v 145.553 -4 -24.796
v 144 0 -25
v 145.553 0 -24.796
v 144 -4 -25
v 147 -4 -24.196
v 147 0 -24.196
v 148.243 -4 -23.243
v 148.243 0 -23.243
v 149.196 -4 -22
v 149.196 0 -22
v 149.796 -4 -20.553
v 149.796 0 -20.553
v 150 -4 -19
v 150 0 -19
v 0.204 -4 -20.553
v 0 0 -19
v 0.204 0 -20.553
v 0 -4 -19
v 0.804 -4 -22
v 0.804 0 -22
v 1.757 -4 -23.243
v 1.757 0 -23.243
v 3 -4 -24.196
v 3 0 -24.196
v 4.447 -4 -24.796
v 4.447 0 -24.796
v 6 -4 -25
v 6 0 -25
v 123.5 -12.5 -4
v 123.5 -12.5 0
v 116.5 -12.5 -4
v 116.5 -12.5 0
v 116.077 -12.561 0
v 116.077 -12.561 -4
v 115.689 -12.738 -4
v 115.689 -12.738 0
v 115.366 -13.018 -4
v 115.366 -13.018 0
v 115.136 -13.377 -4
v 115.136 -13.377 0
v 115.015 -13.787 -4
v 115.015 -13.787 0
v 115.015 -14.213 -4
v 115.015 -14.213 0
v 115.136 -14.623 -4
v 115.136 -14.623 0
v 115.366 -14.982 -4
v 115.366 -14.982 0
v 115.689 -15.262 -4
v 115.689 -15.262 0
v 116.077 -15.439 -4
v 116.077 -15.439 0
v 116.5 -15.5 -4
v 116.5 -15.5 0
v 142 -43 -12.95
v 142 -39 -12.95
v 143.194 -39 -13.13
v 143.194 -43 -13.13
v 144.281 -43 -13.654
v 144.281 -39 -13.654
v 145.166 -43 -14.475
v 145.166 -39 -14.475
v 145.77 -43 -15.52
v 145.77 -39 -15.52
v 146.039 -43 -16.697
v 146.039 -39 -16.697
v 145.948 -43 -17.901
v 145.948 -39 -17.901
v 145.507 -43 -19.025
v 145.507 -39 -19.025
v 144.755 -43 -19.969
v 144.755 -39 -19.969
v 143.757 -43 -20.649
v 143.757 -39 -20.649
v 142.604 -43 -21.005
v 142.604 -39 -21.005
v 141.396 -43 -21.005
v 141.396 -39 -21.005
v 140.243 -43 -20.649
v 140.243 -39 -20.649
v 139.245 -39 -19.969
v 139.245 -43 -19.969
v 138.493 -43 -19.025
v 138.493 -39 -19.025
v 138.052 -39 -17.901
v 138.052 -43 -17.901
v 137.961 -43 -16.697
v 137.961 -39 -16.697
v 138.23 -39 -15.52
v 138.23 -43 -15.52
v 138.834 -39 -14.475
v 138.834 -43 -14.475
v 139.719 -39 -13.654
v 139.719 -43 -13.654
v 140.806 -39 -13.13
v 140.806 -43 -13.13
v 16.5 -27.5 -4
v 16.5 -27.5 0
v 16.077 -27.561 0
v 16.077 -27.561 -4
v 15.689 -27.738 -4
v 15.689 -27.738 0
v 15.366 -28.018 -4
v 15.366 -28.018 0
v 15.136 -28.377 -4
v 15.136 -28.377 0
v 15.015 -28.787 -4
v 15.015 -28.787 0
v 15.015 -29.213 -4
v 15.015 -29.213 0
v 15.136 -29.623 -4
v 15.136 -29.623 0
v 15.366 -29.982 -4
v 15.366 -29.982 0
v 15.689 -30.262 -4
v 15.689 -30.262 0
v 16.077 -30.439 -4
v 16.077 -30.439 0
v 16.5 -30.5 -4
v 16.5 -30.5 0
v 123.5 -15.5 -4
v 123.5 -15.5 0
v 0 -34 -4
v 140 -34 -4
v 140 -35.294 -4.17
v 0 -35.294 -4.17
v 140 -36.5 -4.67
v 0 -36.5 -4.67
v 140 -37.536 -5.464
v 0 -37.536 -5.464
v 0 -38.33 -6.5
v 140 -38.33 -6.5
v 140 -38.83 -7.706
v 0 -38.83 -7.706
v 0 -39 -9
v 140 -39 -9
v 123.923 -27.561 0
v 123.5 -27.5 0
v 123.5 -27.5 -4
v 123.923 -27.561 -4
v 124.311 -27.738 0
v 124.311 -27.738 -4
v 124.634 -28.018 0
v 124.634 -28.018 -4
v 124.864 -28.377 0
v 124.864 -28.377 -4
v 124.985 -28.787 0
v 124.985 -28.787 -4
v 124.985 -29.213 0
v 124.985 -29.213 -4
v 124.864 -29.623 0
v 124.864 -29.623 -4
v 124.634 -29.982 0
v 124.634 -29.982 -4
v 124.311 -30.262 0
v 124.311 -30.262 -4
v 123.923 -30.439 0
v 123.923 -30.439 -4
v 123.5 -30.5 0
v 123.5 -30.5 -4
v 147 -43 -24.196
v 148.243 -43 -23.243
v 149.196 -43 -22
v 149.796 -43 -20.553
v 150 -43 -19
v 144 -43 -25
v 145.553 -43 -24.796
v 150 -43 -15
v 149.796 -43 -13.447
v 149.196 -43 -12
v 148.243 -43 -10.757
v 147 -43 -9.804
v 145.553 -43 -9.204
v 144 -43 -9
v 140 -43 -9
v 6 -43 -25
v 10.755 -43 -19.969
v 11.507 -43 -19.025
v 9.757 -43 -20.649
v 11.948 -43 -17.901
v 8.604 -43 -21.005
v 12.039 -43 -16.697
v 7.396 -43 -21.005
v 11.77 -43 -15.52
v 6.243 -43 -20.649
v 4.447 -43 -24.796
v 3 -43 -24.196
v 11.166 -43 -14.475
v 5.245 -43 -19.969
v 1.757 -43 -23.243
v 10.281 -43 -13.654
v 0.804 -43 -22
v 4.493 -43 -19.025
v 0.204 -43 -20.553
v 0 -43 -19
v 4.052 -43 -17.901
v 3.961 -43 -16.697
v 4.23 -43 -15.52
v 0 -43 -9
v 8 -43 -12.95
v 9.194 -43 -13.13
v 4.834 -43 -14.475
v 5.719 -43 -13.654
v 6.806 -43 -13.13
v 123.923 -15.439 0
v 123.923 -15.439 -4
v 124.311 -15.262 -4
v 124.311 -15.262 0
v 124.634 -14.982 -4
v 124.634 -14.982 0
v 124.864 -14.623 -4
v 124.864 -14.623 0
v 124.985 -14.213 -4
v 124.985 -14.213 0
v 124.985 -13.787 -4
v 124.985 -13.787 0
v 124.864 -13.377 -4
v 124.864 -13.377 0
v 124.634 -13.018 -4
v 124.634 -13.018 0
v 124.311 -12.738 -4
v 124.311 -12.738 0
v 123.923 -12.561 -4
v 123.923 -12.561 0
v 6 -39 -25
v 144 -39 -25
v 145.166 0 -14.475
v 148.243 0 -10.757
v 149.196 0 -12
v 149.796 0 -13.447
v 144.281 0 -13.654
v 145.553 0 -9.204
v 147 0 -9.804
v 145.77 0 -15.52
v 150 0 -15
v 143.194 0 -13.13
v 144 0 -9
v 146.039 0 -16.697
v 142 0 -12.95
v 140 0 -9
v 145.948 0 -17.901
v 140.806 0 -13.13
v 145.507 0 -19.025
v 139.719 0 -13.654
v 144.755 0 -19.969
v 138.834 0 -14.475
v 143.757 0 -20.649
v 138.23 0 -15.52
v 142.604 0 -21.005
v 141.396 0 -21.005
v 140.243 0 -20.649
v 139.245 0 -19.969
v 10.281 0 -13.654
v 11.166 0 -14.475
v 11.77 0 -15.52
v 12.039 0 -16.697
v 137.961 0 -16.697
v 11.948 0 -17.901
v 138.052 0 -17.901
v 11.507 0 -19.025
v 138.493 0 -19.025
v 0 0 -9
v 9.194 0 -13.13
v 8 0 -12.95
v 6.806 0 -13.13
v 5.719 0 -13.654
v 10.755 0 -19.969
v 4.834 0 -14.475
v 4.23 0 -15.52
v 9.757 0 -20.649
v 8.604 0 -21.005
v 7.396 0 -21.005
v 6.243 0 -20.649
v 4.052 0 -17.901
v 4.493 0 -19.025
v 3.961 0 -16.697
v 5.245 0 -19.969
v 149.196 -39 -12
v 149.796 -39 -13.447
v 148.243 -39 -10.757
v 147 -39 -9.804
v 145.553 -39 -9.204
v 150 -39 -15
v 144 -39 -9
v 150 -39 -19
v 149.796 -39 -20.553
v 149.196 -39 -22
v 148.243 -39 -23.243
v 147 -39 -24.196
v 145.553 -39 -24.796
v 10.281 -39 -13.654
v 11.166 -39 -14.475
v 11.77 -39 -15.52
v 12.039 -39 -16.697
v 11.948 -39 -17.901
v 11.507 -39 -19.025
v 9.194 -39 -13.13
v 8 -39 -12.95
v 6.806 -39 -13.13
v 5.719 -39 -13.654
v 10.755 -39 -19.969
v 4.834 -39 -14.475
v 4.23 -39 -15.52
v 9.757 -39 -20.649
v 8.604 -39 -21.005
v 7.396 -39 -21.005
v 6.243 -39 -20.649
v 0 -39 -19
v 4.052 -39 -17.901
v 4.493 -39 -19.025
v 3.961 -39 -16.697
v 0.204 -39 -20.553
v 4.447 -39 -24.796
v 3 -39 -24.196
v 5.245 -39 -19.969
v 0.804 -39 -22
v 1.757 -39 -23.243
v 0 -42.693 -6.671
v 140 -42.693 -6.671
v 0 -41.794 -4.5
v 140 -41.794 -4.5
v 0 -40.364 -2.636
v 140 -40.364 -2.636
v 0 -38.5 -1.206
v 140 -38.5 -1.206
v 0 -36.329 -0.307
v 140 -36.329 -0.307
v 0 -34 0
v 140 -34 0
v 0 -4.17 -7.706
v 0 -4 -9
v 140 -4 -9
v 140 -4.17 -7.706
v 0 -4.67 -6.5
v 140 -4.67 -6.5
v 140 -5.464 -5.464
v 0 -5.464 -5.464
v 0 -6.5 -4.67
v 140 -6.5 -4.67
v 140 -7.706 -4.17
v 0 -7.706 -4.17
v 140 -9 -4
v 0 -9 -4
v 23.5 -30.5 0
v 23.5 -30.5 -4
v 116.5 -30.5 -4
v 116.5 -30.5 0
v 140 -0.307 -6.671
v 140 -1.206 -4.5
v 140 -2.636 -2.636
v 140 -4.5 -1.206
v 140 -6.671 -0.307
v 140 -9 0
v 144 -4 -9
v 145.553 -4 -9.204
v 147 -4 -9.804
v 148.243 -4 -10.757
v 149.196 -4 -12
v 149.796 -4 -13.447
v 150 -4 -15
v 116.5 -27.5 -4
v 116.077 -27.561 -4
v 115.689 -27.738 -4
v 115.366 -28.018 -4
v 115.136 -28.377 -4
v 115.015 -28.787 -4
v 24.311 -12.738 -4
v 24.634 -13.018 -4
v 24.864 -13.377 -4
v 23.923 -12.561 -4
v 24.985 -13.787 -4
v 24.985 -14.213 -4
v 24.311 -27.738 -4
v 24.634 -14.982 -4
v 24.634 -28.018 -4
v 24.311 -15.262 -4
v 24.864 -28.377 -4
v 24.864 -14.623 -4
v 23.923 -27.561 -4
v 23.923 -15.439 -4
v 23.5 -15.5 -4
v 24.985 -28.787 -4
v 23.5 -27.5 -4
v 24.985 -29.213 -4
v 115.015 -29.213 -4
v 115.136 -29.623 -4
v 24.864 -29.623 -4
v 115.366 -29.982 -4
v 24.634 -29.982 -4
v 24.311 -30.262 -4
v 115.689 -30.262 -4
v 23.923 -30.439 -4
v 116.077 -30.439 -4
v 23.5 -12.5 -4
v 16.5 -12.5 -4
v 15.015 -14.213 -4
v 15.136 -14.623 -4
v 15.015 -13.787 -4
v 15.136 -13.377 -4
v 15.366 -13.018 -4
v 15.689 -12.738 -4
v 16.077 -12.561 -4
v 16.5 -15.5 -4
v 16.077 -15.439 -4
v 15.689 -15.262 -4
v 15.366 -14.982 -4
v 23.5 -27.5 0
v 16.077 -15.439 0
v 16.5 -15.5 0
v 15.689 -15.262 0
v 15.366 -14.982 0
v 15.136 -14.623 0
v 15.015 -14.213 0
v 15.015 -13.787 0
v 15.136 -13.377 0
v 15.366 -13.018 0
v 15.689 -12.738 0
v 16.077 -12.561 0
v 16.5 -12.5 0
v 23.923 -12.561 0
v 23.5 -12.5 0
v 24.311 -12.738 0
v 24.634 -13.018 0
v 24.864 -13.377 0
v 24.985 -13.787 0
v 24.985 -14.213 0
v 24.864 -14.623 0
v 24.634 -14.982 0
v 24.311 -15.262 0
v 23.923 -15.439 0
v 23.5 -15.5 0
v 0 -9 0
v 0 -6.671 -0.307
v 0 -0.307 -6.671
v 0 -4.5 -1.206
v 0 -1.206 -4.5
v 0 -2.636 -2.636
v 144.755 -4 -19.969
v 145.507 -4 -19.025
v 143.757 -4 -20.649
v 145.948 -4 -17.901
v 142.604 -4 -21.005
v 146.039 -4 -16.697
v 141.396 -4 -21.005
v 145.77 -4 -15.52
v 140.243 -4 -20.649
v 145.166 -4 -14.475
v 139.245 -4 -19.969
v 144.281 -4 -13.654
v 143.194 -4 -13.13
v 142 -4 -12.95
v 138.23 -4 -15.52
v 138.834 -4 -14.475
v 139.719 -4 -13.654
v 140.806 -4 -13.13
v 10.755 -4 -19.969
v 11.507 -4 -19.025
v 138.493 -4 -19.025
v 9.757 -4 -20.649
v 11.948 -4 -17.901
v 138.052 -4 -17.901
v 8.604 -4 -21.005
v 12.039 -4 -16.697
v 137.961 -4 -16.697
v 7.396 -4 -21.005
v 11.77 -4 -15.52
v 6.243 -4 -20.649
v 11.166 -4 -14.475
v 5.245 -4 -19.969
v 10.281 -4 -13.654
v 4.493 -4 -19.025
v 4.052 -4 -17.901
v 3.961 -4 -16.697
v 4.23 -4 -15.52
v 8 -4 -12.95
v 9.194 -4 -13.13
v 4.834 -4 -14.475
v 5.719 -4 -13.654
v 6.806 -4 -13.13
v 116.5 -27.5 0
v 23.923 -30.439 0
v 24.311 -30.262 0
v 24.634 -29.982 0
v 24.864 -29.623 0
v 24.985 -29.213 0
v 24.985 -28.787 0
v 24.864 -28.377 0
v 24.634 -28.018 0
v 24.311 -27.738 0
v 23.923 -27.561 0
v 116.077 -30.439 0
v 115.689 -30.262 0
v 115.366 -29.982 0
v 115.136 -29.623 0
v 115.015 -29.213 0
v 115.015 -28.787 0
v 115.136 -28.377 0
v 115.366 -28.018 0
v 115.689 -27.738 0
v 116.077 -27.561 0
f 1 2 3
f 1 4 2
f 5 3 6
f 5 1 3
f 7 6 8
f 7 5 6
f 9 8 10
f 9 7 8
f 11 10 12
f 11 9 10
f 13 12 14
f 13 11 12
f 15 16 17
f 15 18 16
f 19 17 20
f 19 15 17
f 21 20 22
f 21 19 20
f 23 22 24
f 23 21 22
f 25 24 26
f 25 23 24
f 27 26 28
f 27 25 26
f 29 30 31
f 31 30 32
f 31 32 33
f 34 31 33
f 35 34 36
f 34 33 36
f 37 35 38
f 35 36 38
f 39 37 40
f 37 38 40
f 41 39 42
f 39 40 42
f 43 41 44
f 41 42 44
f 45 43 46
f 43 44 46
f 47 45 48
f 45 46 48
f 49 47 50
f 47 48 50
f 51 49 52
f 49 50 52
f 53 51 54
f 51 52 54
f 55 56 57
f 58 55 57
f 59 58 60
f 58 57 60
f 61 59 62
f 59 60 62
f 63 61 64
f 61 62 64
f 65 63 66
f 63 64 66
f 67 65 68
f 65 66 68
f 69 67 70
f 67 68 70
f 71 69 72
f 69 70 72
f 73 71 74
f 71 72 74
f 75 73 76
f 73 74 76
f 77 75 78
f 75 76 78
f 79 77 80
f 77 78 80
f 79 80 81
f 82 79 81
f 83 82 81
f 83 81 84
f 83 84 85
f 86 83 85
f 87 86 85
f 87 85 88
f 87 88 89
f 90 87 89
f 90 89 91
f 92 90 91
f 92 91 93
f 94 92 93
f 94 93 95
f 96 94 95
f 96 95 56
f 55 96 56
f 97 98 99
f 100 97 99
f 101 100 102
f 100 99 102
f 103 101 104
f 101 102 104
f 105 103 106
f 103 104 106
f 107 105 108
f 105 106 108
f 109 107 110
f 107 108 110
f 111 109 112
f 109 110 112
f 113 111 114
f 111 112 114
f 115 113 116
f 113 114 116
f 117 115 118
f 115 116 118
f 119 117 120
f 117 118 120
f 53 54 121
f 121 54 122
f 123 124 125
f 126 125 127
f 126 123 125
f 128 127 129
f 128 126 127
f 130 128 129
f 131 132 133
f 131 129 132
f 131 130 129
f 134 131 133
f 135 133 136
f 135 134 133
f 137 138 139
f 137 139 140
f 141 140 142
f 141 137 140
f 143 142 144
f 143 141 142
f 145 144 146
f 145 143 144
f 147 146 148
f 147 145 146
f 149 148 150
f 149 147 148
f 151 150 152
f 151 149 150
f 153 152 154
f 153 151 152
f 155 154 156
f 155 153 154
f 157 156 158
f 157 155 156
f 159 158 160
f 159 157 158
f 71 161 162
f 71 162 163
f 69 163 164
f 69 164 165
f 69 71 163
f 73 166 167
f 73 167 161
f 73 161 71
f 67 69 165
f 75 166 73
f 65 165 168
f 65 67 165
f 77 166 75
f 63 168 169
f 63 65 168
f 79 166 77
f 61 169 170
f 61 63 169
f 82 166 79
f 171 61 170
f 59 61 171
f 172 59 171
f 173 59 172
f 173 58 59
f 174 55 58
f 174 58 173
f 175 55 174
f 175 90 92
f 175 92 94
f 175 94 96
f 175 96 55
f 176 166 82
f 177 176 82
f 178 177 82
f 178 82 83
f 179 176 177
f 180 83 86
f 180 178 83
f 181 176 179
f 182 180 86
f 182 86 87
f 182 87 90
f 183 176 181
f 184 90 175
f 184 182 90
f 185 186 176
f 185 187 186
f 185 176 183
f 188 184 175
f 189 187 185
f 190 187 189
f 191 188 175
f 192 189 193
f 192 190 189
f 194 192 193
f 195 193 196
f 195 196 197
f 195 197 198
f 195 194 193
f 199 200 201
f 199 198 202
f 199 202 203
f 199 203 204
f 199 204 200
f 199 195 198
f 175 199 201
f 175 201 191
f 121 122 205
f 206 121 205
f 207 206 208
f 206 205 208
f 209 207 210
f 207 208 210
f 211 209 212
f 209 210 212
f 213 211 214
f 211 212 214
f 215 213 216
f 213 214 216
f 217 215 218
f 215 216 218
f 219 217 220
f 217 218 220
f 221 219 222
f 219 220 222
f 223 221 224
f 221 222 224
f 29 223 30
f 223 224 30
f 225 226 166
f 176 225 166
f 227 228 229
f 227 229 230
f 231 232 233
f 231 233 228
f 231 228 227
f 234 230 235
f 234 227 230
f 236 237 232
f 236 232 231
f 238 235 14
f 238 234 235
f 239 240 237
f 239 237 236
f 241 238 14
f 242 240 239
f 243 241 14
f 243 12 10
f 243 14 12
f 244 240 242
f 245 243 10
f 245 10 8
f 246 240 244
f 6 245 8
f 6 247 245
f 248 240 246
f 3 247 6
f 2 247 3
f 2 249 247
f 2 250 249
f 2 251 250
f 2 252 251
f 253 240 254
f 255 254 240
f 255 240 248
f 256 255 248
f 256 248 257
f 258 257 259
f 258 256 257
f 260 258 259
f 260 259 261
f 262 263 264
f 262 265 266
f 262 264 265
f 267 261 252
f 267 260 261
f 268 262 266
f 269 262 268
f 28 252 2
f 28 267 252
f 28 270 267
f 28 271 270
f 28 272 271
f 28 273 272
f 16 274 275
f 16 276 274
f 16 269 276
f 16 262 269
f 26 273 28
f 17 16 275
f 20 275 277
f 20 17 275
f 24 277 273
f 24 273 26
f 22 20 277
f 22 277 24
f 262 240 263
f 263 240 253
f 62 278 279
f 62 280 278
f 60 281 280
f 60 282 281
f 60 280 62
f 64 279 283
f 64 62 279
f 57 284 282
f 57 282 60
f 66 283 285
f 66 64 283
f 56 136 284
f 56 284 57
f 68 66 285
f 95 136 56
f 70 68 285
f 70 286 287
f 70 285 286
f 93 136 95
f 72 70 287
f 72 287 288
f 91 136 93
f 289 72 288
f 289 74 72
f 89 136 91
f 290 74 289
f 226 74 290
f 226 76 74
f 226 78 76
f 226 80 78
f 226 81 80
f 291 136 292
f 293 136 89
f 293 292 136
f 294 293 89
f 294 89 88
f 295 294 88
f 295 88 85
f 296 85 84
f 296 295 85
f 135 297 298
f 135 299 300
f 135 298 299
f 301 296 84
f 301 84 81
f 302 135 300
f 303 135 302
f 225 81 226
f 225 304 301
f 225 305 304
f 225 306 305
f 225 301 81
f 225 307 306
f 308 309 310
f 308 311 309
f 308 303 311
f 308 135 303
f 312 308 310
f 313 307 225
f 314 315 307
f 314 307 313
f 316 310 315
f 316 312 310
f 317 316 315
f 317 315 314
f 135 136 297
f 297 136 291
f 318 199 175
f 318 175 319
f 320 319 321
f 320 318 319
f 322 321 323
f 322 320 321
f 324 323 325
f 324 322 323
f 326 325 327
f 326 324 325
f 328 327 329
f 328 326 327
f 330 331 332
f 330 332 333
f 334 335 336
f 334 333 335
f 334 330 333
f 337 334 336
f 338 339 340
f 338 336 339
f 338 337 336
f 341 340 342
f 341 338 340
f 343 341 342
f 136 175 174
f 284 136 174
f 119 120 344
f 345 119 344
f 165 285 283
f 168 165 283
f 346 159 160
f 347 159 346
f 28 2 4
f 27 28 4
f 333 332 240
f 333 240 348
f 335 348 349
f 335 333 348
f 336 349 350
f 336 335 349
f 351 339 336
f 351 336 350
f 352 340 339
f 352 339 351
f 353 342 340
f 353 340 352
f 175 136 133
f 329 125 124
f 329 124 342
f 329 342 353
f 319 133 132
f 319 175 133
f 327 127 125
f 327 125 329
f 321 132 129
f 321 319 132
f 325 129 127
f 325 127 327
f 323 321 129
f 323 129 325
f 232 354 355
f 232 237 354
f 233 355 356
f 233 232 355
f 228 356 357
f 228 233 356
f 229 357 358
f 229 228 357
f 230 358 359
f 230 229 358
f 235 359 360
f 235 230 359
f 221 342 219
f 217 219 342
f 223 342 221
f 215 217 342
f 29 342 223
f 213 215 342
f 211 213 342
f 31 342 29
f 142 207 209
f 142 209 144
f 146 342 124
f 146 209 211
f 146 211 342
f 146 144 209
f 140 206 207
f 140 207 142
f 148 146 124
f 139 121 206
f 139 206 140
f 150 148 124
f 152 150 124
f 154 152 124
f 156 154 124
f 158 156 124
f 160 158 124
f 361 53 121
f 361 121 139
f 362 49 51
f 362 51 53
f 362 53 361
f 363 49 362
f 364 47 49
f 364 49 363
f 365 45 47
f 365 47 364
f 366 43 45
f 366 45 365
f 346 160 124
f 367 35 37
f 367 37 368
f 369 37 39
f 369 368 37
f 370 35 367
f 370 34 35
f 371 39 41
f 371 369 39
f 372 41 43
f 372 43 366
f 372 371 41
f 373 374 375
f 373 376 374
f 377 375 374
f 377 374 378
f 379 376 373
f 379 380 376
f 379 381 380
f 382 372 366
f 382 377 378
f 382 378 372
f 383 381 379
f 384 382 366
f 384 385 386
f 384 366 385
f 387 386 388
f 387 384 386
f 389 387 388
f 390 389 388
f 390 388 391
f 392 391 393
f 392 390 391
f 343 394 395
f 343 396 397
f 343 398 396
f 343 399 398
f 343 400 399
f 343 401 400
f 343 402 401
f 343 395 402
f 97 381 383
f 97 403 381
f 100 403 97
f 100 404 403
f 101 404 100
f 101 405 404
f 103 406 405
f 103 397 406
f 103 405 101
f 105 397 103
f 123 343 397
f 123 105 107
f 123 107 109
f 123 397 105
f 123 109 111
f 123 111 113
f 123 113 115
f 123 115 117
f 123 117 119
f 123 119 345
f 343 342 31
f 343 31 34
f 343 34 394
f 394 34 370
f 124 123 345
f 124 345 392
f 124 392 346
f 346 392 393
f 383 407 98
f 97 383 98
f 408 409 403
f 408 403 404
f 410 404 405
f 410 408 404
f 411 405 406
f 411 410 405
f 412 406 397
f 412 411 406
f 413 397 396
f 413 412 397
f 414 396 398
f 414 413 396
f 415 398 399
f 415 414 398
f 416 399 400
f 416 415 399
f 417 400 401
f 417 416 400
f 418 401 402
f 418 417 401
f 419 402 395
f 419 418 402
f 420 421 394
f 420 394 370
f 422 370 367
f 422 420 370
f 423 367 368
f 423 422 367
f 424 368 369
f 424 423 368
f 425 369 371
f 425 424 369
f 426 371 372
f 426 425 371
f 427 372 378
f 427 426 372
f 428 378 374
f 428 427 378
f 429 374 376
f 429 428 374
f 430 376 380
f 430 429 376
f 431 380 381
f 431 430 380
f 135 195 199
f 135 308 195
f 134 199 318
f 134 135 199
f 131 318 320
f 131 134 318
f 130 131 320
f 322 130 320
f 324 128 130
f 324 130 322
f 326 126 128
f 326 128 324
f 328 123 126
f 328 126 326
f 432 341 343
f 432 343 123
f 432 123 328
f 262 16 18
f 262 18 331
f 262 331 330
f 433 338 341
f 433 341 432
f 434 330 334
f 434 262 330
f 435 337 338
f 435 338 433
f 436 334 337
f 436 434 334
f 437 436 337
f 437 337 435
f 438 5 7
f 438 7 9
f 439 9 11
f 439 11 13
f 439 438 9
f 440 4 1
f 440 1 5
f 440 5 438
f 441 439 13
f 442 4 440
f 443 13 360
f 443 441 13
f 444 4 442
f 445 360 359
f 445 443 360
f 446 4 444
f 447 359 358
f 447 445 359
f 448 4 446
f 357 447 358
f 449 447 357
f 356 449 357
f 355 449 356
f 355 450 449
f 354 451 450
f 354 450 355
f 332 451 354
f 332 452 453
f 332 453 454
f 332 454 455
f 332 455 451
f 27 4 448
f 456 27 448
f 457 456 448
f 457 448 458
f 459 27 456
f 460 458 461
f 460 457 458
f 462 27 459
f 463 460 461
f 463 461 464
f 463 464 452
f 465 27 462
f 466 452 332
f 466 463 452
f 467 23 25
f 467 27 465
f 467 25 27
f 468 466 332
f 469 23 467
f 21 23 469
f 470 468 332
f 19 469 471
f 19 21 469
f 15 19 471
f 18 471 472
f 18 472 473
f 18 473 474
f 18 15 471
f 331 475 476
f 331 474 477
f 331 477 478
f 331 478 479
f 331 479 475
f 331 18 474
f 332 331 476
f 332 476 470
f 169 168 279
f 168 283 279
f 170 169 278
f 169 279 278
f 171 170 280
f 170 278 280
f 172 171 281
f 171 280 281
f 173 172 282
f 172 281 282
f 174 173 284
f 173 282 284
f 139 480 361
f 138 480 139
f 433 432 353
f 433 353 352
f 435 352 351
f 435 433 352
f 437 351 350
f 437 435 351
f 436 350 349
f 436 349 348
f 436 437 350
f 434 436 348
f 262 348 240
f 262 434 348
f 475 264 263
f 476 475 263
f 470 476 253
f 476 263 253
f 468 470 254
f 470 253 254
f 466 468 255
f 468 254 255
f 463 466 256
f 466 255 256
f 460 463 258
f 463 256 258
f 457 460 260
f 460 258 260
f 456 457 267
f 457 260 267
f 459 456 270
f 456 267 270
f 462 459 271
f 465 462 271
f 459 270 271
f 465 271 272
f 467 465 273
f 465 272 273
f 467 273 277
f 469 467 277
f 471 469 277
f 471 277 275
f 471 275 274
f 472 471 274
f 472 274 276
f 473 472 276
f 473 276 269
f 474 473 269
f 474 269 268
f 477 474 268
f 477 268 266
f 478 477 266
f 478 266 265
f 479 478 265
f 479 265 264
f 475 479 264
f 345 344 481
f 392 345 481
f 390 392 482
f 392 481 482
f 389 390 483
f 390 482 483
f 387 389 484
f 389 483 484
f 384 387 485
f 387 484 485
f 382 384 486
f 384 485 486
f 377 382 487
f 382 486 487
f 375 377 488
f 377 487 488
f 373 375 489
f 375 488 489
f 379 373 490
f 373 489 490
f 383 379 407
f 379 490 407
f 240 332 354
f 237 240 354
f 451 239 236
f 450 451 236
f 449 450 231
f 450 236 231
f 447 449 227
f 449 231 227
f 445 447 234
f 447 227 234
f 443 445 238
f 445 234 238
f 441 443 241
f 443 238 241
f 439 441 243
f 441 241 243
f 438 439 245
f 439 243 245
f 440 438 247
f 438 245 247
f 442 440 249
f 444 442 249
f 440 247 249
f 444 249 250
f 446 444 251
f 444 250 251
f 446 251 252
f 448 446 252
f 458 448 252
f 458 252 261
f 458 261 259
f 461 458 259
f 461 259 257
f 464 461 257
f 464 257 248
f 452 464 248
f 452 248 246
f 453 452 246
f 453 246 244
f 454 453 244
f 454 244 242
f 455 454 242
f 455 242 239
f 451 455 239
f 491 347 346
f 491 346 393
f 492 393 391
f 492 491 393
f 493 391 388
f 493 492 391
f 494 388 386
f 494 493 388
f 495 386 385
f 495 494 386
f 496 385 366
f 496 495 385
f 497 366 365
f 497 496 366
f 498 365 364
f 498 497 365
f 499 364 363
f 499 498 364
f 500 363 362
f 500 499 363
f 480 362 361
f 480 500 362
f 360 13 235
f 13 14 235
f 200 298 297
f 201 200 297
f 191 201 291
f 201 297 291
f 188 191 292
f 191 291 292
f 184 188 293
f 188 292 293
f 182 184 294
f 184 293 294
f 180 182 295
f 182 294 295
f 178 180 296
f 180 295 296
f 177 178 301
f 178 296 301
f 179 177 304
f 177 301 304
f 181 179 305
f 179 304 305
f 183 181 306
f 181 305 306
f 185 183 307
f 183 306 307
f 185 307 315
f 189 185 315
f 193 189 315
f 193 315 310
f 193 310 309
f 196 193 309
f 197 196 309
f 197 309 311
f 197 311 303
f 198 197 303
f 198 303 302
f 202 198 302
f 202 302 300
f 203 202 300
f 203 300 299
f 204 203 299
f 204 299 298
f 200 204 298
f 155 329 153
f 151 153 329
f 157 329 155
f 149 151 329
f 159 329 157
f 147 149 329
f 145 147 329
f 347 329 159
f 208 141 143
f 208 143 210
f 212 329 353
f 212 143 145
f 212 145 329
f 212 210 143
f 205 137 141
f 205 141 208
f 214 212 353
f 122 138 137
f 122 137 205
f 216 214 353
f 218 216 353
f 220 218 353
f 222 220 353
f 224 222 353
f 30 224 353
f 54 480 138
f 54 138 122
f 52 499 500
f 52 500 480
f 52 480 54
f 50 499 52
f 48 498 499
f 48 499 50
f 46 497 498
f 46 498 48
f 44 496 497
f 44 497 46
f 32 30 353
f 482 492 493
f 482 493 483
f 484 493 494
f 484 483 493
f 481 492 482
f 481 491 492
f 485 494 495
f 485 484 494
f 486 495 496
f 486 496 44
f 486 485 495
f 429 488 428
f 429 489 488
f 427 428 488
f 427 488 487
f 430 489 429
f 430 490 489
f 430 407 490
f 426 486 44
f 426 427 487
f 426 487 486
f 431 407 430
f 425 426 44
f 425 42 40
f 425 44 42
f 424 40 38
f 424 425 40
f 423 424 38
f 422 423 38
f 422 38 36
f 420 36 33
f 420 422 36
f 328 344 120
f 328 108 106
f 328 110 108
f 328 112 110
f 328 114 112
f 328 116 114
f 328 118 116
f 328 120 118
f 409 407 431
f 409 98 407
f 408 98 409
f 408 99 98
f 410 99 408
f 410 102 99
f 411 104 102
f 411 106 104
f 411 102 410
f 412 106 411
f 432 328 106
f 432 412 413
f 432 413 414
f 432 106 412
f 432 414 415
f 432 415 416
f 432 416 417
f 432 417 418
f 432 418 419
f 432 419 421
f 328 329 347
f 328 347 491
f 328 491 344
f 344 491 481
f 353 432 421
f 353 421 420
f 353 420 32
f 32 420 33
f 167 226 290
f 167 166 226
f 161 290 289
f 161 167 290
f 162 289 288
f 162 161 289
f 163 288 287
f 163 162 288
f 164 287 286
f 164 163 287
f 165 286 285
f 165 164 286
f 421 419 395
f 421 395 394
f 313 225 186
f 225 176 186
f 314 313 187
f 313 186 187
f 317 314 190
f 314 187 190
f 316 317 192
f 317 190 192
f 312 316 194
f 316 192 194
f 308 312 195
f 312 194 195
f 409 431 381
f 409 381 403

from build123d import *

# Parameters (mm, degrees)
EXTRUSION_DEPTH  = 150
SKETCH_4_R       = 4.05
HOLES_DEPTH      = 159.031642401
SKETCH_5_W       = 10
SKETCH_5_H       = 9
SLOT_DEPTH       = 159.031642401
FILLET_2_R       = 6
MORE_HOLES_DEPTH = 4


# Sheet-metal steps are written as plain solids
with BuildPart() as part:
    # Sketch 1 → Extrusion (new body)
    with BuildSketch(Plane(origin=(0, 0, 0), x_dir=(0, 0, -1), z_dir=(1, 0, 0))):
        with BuildLine():
            Line((25, -43), (9, -43))
            ThreePointArc((9, -43), (2.636038969, -40.363961031), (0, -34))
            Line((0, -34), (0, -9))
            ThreePointArc((0, -9), (2.636038969, -2.636038969), (9, 0))
            Line((9, 0), (25, 0))
            Line((25, 0), (25, -4))
            Line((25, -4), (9, -4))
            ThreePointArc((9, -4), (5.464466094, -5.464466094), (4, -9))
            Line((4, -9), (4, -34))
            ThreePointArc((4, -34), (5.464466094, -37.535533906), (9, -39))
            Line((9, -39), (25, -39))
            Line((25, -39), (25, -43))
        make_face()
    extrude(amount=EXTRUSION_DEPTH)

    # Эскиз4 → Holes (cut, through all)
    with BuildSketch(Plane(origin=(0, 0, 0), x_dir=(1, 0, 0), z_dir=(0, 1, 0))):
        with Locations(Location((8, 17, 0), (0, 0, 270))):
            Circle(SKETCH_4_R)
        with Locations(Location((142, 17, 0), (0, 0, 270))):
            Circle(SKETCH_4_R)
    extrude(amount=-HOLES_DEPTH, mode=Mode.SUBTRACT)

    # Эскиз5 → SLot (cut, through all)
    with BuildSketch(Plane.XZ.offset(43)):
        with Locations((145, -4.5)):
            Rectangle(SKETCH_5_W, SKETCH_5_H)
    extrude(amount=-SLOT_DEPTH, mode=Mode.SUBTRACT)

    # Fillet 2
    fillet_2_edges = [part.edges().sort_by_distance(p)[0] for p in [
        (0, -41, -25),
        (0, -2, -25),
        (150, -41, -25),
        (150, -2, -9),
        (150, -41, -9),
        (150, -2, -25),
    ]]
    fillet(fillet_2_edges, radius=FILLET_2_R)

    # Эскиз6 → More Holes (cut)
    with BuildSketch(Plane.XY):
        with BuildLine():
            Line((16.5, -12.5), (23.5, -12.5))
            ThreePointArc((23.5, -12.5), (25, -14), (23.5, -15.5))
            Line((23.5, -15.5), (16.5, -15.5))
            ThreePointArc((16.5, -15.5), (15, -14), (16.5, -12.5))
        make_face()
        with BuildLine():
            Line((123.5, -12.5), (116.5, -12.5))
            ThreePointArc((116.5, -12.5), (115, -14), (116.5, -15.5))
            Line((116.5, -15.5), (123.5, -15.5))
            ThreePointArc((123.5, -15.5), (125, -14), (123.5, -12.5))
        make_face()
        with BuildLine():
            Line((123.5, -30.5), (116.5, -30.5))
            ThreePointArc((116.5, -30.5), (115, -29), (116.5, -27.5))
            Line((116.5, -27.5), (123.5, -27.5))
            ThreePointArc((123.5, -27.5), (125, -29), (123.5, -30.5))
        make_face()
        with BuildLine():
            Line((16.5, -30.5), (23.5, -30.5))
            ThreePointArc((23.5, -30.5), (25, -29), (23.5, -27.5))
            Line((23.5, -27.5), (16.5, -27.5))
            ThreePointArc((16.5, -27.5), (15, -29), (16.5, -30.5))
        make_face()
    extrude(amount=-MORE_HOLES_DEPTH, mode=Mode.SUBTRACT)


solid = part.part
